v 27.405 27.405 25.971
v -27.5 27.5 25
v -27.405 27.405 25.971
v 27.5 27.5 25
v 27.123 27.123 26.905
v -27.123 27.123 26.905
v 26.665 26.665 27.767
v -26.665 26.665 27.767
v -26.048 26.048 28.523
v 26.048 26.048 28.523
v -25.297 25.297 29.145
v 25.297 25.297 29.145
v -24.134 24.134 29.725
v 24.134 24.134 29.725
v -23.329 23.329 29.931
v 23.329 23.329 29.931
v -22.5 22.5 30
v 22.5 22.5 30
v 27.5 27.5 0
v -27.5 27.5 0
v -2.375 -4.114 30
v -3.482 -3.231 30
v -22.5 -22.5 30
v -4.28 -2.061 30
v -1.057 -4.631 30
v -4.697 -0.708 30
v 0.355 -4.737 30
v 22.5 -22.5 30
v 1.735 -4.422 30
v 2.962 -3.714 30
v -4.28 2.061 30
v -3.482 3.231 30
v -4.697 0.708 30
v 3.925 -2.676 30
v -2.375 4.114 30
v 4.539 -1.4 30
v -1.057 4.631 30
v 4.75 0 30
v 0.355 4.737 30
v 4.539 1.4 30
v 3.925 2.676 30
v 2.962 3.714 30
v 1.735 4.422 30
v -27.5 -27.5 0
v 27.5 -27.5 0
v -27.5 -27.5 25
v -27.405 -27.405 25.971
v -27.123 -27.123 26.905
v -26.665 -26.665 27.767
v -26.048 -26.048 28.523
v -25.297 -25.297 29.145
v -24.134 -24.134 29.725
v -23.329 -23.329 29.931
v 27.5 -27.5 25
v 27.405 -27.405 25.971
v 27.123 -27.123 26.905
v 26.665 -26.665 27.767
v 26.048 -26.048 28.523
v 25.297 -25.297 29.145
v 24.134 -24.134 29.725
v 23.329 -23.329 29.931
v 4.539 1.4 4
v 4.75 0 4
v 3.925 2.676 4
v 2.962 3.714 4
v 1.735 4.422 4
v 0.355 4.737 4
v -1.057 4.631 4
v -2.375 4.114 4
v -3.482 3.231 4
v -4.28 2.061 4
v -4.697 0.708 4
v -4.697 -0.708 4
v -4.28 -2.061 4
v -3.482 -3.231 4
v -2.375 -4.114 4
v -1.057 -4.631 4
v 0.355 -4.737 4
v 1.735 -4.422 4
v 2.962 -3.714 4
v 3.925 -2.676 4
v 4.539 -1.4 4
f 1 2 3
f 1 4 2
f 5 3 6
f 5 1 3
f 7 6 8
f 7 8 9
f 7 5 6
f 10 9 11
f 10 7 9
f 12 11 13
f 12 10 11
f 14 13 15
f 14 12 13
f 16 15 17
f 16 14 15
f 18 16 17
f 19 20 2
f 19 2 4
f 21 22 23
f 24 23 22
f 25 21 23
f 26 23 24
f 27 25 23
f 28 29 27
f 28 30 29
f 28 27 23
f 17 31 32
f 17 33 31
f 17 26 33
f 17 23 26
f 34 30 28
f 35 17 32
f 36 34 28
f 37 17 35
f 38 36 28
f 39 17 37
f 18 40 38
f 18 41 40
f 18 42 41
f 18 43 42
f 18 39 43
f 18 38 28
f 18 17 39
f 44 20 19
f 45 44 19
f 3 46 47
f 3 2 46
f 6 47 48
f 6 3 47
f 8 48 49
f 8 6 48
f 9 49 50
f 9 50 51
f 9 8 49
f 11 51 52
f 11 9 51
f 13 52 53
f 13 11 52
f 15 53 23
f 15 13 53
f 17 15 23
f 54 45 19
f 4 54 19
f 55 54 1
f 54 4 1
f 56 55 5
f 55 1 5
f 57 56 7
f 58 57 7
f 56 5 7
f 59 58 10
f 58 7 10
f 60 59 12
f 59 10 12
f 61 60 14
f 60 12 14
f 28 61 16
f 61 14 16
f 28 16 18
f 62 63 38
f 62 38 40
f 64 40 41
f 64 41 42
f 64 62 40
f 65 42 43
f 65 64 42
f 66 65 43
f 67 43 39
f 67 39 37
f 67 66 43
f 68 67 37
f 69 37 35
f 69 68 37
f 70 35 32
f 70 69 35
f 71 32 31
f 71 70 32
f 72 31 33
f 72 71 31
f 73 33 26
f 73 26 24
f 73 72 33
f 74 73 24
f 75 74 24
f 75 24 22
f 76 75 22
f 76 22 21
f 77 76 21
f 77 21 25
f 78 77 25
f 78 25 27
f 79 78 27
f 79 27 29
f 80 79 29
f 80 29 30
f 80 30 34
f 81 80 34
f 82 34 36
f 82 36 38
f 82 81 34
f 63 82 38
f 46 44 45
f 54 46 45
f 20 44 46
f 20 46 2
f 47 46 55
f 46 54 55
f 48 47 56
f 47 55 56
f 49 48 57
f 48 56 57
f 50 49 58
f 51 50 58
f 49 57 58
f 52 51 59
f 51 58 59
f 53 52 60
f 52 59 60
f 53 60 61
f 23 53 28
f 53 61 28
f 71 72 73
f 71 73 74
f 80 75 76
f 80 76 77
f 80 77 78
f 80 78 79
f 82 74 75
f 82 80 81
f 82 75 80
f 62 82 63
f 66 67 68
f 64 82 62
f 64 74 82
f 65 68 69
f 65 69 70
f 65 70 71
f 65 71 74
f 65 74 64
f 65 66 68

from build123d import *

# Parameters (mm, degrees)
F0_W     = 55
F0_H     = 55
F1_DEPTH = 4
F2_W     = 55
F2_H     = 55
F2_R     = 4.75
F3_DEPTH = 26
F4_R     = 5


with BuildPart() as f1:
    # F0 (on Top) → F1 (new body)
    with BuildSketch(Plane.XY):
        Rectangle(F0_W, F0_H)
    extrude(amount=F1_DEPTH)

    # F2 (on face) → F3 (join)
    with BuildSketch(Plane.XY.offset(4)):
        Rectangle(F2_W, F2_H)
        Circle(F2_R, mode=Mode.SUBTRACT)
    extrude(amount=F3_DEPTH)

    # F4
    f4_edges = [f1.edges().sort_by_distance(p)[0] for p in [
        (0, 27.5, 30),
        (-27.5, 0, 30),
        (0, -27.5, 30),
        (27.5, 0, 30),
    ]]
    fillet(f4_edges, radius=F4_R)


solid = f1.part
